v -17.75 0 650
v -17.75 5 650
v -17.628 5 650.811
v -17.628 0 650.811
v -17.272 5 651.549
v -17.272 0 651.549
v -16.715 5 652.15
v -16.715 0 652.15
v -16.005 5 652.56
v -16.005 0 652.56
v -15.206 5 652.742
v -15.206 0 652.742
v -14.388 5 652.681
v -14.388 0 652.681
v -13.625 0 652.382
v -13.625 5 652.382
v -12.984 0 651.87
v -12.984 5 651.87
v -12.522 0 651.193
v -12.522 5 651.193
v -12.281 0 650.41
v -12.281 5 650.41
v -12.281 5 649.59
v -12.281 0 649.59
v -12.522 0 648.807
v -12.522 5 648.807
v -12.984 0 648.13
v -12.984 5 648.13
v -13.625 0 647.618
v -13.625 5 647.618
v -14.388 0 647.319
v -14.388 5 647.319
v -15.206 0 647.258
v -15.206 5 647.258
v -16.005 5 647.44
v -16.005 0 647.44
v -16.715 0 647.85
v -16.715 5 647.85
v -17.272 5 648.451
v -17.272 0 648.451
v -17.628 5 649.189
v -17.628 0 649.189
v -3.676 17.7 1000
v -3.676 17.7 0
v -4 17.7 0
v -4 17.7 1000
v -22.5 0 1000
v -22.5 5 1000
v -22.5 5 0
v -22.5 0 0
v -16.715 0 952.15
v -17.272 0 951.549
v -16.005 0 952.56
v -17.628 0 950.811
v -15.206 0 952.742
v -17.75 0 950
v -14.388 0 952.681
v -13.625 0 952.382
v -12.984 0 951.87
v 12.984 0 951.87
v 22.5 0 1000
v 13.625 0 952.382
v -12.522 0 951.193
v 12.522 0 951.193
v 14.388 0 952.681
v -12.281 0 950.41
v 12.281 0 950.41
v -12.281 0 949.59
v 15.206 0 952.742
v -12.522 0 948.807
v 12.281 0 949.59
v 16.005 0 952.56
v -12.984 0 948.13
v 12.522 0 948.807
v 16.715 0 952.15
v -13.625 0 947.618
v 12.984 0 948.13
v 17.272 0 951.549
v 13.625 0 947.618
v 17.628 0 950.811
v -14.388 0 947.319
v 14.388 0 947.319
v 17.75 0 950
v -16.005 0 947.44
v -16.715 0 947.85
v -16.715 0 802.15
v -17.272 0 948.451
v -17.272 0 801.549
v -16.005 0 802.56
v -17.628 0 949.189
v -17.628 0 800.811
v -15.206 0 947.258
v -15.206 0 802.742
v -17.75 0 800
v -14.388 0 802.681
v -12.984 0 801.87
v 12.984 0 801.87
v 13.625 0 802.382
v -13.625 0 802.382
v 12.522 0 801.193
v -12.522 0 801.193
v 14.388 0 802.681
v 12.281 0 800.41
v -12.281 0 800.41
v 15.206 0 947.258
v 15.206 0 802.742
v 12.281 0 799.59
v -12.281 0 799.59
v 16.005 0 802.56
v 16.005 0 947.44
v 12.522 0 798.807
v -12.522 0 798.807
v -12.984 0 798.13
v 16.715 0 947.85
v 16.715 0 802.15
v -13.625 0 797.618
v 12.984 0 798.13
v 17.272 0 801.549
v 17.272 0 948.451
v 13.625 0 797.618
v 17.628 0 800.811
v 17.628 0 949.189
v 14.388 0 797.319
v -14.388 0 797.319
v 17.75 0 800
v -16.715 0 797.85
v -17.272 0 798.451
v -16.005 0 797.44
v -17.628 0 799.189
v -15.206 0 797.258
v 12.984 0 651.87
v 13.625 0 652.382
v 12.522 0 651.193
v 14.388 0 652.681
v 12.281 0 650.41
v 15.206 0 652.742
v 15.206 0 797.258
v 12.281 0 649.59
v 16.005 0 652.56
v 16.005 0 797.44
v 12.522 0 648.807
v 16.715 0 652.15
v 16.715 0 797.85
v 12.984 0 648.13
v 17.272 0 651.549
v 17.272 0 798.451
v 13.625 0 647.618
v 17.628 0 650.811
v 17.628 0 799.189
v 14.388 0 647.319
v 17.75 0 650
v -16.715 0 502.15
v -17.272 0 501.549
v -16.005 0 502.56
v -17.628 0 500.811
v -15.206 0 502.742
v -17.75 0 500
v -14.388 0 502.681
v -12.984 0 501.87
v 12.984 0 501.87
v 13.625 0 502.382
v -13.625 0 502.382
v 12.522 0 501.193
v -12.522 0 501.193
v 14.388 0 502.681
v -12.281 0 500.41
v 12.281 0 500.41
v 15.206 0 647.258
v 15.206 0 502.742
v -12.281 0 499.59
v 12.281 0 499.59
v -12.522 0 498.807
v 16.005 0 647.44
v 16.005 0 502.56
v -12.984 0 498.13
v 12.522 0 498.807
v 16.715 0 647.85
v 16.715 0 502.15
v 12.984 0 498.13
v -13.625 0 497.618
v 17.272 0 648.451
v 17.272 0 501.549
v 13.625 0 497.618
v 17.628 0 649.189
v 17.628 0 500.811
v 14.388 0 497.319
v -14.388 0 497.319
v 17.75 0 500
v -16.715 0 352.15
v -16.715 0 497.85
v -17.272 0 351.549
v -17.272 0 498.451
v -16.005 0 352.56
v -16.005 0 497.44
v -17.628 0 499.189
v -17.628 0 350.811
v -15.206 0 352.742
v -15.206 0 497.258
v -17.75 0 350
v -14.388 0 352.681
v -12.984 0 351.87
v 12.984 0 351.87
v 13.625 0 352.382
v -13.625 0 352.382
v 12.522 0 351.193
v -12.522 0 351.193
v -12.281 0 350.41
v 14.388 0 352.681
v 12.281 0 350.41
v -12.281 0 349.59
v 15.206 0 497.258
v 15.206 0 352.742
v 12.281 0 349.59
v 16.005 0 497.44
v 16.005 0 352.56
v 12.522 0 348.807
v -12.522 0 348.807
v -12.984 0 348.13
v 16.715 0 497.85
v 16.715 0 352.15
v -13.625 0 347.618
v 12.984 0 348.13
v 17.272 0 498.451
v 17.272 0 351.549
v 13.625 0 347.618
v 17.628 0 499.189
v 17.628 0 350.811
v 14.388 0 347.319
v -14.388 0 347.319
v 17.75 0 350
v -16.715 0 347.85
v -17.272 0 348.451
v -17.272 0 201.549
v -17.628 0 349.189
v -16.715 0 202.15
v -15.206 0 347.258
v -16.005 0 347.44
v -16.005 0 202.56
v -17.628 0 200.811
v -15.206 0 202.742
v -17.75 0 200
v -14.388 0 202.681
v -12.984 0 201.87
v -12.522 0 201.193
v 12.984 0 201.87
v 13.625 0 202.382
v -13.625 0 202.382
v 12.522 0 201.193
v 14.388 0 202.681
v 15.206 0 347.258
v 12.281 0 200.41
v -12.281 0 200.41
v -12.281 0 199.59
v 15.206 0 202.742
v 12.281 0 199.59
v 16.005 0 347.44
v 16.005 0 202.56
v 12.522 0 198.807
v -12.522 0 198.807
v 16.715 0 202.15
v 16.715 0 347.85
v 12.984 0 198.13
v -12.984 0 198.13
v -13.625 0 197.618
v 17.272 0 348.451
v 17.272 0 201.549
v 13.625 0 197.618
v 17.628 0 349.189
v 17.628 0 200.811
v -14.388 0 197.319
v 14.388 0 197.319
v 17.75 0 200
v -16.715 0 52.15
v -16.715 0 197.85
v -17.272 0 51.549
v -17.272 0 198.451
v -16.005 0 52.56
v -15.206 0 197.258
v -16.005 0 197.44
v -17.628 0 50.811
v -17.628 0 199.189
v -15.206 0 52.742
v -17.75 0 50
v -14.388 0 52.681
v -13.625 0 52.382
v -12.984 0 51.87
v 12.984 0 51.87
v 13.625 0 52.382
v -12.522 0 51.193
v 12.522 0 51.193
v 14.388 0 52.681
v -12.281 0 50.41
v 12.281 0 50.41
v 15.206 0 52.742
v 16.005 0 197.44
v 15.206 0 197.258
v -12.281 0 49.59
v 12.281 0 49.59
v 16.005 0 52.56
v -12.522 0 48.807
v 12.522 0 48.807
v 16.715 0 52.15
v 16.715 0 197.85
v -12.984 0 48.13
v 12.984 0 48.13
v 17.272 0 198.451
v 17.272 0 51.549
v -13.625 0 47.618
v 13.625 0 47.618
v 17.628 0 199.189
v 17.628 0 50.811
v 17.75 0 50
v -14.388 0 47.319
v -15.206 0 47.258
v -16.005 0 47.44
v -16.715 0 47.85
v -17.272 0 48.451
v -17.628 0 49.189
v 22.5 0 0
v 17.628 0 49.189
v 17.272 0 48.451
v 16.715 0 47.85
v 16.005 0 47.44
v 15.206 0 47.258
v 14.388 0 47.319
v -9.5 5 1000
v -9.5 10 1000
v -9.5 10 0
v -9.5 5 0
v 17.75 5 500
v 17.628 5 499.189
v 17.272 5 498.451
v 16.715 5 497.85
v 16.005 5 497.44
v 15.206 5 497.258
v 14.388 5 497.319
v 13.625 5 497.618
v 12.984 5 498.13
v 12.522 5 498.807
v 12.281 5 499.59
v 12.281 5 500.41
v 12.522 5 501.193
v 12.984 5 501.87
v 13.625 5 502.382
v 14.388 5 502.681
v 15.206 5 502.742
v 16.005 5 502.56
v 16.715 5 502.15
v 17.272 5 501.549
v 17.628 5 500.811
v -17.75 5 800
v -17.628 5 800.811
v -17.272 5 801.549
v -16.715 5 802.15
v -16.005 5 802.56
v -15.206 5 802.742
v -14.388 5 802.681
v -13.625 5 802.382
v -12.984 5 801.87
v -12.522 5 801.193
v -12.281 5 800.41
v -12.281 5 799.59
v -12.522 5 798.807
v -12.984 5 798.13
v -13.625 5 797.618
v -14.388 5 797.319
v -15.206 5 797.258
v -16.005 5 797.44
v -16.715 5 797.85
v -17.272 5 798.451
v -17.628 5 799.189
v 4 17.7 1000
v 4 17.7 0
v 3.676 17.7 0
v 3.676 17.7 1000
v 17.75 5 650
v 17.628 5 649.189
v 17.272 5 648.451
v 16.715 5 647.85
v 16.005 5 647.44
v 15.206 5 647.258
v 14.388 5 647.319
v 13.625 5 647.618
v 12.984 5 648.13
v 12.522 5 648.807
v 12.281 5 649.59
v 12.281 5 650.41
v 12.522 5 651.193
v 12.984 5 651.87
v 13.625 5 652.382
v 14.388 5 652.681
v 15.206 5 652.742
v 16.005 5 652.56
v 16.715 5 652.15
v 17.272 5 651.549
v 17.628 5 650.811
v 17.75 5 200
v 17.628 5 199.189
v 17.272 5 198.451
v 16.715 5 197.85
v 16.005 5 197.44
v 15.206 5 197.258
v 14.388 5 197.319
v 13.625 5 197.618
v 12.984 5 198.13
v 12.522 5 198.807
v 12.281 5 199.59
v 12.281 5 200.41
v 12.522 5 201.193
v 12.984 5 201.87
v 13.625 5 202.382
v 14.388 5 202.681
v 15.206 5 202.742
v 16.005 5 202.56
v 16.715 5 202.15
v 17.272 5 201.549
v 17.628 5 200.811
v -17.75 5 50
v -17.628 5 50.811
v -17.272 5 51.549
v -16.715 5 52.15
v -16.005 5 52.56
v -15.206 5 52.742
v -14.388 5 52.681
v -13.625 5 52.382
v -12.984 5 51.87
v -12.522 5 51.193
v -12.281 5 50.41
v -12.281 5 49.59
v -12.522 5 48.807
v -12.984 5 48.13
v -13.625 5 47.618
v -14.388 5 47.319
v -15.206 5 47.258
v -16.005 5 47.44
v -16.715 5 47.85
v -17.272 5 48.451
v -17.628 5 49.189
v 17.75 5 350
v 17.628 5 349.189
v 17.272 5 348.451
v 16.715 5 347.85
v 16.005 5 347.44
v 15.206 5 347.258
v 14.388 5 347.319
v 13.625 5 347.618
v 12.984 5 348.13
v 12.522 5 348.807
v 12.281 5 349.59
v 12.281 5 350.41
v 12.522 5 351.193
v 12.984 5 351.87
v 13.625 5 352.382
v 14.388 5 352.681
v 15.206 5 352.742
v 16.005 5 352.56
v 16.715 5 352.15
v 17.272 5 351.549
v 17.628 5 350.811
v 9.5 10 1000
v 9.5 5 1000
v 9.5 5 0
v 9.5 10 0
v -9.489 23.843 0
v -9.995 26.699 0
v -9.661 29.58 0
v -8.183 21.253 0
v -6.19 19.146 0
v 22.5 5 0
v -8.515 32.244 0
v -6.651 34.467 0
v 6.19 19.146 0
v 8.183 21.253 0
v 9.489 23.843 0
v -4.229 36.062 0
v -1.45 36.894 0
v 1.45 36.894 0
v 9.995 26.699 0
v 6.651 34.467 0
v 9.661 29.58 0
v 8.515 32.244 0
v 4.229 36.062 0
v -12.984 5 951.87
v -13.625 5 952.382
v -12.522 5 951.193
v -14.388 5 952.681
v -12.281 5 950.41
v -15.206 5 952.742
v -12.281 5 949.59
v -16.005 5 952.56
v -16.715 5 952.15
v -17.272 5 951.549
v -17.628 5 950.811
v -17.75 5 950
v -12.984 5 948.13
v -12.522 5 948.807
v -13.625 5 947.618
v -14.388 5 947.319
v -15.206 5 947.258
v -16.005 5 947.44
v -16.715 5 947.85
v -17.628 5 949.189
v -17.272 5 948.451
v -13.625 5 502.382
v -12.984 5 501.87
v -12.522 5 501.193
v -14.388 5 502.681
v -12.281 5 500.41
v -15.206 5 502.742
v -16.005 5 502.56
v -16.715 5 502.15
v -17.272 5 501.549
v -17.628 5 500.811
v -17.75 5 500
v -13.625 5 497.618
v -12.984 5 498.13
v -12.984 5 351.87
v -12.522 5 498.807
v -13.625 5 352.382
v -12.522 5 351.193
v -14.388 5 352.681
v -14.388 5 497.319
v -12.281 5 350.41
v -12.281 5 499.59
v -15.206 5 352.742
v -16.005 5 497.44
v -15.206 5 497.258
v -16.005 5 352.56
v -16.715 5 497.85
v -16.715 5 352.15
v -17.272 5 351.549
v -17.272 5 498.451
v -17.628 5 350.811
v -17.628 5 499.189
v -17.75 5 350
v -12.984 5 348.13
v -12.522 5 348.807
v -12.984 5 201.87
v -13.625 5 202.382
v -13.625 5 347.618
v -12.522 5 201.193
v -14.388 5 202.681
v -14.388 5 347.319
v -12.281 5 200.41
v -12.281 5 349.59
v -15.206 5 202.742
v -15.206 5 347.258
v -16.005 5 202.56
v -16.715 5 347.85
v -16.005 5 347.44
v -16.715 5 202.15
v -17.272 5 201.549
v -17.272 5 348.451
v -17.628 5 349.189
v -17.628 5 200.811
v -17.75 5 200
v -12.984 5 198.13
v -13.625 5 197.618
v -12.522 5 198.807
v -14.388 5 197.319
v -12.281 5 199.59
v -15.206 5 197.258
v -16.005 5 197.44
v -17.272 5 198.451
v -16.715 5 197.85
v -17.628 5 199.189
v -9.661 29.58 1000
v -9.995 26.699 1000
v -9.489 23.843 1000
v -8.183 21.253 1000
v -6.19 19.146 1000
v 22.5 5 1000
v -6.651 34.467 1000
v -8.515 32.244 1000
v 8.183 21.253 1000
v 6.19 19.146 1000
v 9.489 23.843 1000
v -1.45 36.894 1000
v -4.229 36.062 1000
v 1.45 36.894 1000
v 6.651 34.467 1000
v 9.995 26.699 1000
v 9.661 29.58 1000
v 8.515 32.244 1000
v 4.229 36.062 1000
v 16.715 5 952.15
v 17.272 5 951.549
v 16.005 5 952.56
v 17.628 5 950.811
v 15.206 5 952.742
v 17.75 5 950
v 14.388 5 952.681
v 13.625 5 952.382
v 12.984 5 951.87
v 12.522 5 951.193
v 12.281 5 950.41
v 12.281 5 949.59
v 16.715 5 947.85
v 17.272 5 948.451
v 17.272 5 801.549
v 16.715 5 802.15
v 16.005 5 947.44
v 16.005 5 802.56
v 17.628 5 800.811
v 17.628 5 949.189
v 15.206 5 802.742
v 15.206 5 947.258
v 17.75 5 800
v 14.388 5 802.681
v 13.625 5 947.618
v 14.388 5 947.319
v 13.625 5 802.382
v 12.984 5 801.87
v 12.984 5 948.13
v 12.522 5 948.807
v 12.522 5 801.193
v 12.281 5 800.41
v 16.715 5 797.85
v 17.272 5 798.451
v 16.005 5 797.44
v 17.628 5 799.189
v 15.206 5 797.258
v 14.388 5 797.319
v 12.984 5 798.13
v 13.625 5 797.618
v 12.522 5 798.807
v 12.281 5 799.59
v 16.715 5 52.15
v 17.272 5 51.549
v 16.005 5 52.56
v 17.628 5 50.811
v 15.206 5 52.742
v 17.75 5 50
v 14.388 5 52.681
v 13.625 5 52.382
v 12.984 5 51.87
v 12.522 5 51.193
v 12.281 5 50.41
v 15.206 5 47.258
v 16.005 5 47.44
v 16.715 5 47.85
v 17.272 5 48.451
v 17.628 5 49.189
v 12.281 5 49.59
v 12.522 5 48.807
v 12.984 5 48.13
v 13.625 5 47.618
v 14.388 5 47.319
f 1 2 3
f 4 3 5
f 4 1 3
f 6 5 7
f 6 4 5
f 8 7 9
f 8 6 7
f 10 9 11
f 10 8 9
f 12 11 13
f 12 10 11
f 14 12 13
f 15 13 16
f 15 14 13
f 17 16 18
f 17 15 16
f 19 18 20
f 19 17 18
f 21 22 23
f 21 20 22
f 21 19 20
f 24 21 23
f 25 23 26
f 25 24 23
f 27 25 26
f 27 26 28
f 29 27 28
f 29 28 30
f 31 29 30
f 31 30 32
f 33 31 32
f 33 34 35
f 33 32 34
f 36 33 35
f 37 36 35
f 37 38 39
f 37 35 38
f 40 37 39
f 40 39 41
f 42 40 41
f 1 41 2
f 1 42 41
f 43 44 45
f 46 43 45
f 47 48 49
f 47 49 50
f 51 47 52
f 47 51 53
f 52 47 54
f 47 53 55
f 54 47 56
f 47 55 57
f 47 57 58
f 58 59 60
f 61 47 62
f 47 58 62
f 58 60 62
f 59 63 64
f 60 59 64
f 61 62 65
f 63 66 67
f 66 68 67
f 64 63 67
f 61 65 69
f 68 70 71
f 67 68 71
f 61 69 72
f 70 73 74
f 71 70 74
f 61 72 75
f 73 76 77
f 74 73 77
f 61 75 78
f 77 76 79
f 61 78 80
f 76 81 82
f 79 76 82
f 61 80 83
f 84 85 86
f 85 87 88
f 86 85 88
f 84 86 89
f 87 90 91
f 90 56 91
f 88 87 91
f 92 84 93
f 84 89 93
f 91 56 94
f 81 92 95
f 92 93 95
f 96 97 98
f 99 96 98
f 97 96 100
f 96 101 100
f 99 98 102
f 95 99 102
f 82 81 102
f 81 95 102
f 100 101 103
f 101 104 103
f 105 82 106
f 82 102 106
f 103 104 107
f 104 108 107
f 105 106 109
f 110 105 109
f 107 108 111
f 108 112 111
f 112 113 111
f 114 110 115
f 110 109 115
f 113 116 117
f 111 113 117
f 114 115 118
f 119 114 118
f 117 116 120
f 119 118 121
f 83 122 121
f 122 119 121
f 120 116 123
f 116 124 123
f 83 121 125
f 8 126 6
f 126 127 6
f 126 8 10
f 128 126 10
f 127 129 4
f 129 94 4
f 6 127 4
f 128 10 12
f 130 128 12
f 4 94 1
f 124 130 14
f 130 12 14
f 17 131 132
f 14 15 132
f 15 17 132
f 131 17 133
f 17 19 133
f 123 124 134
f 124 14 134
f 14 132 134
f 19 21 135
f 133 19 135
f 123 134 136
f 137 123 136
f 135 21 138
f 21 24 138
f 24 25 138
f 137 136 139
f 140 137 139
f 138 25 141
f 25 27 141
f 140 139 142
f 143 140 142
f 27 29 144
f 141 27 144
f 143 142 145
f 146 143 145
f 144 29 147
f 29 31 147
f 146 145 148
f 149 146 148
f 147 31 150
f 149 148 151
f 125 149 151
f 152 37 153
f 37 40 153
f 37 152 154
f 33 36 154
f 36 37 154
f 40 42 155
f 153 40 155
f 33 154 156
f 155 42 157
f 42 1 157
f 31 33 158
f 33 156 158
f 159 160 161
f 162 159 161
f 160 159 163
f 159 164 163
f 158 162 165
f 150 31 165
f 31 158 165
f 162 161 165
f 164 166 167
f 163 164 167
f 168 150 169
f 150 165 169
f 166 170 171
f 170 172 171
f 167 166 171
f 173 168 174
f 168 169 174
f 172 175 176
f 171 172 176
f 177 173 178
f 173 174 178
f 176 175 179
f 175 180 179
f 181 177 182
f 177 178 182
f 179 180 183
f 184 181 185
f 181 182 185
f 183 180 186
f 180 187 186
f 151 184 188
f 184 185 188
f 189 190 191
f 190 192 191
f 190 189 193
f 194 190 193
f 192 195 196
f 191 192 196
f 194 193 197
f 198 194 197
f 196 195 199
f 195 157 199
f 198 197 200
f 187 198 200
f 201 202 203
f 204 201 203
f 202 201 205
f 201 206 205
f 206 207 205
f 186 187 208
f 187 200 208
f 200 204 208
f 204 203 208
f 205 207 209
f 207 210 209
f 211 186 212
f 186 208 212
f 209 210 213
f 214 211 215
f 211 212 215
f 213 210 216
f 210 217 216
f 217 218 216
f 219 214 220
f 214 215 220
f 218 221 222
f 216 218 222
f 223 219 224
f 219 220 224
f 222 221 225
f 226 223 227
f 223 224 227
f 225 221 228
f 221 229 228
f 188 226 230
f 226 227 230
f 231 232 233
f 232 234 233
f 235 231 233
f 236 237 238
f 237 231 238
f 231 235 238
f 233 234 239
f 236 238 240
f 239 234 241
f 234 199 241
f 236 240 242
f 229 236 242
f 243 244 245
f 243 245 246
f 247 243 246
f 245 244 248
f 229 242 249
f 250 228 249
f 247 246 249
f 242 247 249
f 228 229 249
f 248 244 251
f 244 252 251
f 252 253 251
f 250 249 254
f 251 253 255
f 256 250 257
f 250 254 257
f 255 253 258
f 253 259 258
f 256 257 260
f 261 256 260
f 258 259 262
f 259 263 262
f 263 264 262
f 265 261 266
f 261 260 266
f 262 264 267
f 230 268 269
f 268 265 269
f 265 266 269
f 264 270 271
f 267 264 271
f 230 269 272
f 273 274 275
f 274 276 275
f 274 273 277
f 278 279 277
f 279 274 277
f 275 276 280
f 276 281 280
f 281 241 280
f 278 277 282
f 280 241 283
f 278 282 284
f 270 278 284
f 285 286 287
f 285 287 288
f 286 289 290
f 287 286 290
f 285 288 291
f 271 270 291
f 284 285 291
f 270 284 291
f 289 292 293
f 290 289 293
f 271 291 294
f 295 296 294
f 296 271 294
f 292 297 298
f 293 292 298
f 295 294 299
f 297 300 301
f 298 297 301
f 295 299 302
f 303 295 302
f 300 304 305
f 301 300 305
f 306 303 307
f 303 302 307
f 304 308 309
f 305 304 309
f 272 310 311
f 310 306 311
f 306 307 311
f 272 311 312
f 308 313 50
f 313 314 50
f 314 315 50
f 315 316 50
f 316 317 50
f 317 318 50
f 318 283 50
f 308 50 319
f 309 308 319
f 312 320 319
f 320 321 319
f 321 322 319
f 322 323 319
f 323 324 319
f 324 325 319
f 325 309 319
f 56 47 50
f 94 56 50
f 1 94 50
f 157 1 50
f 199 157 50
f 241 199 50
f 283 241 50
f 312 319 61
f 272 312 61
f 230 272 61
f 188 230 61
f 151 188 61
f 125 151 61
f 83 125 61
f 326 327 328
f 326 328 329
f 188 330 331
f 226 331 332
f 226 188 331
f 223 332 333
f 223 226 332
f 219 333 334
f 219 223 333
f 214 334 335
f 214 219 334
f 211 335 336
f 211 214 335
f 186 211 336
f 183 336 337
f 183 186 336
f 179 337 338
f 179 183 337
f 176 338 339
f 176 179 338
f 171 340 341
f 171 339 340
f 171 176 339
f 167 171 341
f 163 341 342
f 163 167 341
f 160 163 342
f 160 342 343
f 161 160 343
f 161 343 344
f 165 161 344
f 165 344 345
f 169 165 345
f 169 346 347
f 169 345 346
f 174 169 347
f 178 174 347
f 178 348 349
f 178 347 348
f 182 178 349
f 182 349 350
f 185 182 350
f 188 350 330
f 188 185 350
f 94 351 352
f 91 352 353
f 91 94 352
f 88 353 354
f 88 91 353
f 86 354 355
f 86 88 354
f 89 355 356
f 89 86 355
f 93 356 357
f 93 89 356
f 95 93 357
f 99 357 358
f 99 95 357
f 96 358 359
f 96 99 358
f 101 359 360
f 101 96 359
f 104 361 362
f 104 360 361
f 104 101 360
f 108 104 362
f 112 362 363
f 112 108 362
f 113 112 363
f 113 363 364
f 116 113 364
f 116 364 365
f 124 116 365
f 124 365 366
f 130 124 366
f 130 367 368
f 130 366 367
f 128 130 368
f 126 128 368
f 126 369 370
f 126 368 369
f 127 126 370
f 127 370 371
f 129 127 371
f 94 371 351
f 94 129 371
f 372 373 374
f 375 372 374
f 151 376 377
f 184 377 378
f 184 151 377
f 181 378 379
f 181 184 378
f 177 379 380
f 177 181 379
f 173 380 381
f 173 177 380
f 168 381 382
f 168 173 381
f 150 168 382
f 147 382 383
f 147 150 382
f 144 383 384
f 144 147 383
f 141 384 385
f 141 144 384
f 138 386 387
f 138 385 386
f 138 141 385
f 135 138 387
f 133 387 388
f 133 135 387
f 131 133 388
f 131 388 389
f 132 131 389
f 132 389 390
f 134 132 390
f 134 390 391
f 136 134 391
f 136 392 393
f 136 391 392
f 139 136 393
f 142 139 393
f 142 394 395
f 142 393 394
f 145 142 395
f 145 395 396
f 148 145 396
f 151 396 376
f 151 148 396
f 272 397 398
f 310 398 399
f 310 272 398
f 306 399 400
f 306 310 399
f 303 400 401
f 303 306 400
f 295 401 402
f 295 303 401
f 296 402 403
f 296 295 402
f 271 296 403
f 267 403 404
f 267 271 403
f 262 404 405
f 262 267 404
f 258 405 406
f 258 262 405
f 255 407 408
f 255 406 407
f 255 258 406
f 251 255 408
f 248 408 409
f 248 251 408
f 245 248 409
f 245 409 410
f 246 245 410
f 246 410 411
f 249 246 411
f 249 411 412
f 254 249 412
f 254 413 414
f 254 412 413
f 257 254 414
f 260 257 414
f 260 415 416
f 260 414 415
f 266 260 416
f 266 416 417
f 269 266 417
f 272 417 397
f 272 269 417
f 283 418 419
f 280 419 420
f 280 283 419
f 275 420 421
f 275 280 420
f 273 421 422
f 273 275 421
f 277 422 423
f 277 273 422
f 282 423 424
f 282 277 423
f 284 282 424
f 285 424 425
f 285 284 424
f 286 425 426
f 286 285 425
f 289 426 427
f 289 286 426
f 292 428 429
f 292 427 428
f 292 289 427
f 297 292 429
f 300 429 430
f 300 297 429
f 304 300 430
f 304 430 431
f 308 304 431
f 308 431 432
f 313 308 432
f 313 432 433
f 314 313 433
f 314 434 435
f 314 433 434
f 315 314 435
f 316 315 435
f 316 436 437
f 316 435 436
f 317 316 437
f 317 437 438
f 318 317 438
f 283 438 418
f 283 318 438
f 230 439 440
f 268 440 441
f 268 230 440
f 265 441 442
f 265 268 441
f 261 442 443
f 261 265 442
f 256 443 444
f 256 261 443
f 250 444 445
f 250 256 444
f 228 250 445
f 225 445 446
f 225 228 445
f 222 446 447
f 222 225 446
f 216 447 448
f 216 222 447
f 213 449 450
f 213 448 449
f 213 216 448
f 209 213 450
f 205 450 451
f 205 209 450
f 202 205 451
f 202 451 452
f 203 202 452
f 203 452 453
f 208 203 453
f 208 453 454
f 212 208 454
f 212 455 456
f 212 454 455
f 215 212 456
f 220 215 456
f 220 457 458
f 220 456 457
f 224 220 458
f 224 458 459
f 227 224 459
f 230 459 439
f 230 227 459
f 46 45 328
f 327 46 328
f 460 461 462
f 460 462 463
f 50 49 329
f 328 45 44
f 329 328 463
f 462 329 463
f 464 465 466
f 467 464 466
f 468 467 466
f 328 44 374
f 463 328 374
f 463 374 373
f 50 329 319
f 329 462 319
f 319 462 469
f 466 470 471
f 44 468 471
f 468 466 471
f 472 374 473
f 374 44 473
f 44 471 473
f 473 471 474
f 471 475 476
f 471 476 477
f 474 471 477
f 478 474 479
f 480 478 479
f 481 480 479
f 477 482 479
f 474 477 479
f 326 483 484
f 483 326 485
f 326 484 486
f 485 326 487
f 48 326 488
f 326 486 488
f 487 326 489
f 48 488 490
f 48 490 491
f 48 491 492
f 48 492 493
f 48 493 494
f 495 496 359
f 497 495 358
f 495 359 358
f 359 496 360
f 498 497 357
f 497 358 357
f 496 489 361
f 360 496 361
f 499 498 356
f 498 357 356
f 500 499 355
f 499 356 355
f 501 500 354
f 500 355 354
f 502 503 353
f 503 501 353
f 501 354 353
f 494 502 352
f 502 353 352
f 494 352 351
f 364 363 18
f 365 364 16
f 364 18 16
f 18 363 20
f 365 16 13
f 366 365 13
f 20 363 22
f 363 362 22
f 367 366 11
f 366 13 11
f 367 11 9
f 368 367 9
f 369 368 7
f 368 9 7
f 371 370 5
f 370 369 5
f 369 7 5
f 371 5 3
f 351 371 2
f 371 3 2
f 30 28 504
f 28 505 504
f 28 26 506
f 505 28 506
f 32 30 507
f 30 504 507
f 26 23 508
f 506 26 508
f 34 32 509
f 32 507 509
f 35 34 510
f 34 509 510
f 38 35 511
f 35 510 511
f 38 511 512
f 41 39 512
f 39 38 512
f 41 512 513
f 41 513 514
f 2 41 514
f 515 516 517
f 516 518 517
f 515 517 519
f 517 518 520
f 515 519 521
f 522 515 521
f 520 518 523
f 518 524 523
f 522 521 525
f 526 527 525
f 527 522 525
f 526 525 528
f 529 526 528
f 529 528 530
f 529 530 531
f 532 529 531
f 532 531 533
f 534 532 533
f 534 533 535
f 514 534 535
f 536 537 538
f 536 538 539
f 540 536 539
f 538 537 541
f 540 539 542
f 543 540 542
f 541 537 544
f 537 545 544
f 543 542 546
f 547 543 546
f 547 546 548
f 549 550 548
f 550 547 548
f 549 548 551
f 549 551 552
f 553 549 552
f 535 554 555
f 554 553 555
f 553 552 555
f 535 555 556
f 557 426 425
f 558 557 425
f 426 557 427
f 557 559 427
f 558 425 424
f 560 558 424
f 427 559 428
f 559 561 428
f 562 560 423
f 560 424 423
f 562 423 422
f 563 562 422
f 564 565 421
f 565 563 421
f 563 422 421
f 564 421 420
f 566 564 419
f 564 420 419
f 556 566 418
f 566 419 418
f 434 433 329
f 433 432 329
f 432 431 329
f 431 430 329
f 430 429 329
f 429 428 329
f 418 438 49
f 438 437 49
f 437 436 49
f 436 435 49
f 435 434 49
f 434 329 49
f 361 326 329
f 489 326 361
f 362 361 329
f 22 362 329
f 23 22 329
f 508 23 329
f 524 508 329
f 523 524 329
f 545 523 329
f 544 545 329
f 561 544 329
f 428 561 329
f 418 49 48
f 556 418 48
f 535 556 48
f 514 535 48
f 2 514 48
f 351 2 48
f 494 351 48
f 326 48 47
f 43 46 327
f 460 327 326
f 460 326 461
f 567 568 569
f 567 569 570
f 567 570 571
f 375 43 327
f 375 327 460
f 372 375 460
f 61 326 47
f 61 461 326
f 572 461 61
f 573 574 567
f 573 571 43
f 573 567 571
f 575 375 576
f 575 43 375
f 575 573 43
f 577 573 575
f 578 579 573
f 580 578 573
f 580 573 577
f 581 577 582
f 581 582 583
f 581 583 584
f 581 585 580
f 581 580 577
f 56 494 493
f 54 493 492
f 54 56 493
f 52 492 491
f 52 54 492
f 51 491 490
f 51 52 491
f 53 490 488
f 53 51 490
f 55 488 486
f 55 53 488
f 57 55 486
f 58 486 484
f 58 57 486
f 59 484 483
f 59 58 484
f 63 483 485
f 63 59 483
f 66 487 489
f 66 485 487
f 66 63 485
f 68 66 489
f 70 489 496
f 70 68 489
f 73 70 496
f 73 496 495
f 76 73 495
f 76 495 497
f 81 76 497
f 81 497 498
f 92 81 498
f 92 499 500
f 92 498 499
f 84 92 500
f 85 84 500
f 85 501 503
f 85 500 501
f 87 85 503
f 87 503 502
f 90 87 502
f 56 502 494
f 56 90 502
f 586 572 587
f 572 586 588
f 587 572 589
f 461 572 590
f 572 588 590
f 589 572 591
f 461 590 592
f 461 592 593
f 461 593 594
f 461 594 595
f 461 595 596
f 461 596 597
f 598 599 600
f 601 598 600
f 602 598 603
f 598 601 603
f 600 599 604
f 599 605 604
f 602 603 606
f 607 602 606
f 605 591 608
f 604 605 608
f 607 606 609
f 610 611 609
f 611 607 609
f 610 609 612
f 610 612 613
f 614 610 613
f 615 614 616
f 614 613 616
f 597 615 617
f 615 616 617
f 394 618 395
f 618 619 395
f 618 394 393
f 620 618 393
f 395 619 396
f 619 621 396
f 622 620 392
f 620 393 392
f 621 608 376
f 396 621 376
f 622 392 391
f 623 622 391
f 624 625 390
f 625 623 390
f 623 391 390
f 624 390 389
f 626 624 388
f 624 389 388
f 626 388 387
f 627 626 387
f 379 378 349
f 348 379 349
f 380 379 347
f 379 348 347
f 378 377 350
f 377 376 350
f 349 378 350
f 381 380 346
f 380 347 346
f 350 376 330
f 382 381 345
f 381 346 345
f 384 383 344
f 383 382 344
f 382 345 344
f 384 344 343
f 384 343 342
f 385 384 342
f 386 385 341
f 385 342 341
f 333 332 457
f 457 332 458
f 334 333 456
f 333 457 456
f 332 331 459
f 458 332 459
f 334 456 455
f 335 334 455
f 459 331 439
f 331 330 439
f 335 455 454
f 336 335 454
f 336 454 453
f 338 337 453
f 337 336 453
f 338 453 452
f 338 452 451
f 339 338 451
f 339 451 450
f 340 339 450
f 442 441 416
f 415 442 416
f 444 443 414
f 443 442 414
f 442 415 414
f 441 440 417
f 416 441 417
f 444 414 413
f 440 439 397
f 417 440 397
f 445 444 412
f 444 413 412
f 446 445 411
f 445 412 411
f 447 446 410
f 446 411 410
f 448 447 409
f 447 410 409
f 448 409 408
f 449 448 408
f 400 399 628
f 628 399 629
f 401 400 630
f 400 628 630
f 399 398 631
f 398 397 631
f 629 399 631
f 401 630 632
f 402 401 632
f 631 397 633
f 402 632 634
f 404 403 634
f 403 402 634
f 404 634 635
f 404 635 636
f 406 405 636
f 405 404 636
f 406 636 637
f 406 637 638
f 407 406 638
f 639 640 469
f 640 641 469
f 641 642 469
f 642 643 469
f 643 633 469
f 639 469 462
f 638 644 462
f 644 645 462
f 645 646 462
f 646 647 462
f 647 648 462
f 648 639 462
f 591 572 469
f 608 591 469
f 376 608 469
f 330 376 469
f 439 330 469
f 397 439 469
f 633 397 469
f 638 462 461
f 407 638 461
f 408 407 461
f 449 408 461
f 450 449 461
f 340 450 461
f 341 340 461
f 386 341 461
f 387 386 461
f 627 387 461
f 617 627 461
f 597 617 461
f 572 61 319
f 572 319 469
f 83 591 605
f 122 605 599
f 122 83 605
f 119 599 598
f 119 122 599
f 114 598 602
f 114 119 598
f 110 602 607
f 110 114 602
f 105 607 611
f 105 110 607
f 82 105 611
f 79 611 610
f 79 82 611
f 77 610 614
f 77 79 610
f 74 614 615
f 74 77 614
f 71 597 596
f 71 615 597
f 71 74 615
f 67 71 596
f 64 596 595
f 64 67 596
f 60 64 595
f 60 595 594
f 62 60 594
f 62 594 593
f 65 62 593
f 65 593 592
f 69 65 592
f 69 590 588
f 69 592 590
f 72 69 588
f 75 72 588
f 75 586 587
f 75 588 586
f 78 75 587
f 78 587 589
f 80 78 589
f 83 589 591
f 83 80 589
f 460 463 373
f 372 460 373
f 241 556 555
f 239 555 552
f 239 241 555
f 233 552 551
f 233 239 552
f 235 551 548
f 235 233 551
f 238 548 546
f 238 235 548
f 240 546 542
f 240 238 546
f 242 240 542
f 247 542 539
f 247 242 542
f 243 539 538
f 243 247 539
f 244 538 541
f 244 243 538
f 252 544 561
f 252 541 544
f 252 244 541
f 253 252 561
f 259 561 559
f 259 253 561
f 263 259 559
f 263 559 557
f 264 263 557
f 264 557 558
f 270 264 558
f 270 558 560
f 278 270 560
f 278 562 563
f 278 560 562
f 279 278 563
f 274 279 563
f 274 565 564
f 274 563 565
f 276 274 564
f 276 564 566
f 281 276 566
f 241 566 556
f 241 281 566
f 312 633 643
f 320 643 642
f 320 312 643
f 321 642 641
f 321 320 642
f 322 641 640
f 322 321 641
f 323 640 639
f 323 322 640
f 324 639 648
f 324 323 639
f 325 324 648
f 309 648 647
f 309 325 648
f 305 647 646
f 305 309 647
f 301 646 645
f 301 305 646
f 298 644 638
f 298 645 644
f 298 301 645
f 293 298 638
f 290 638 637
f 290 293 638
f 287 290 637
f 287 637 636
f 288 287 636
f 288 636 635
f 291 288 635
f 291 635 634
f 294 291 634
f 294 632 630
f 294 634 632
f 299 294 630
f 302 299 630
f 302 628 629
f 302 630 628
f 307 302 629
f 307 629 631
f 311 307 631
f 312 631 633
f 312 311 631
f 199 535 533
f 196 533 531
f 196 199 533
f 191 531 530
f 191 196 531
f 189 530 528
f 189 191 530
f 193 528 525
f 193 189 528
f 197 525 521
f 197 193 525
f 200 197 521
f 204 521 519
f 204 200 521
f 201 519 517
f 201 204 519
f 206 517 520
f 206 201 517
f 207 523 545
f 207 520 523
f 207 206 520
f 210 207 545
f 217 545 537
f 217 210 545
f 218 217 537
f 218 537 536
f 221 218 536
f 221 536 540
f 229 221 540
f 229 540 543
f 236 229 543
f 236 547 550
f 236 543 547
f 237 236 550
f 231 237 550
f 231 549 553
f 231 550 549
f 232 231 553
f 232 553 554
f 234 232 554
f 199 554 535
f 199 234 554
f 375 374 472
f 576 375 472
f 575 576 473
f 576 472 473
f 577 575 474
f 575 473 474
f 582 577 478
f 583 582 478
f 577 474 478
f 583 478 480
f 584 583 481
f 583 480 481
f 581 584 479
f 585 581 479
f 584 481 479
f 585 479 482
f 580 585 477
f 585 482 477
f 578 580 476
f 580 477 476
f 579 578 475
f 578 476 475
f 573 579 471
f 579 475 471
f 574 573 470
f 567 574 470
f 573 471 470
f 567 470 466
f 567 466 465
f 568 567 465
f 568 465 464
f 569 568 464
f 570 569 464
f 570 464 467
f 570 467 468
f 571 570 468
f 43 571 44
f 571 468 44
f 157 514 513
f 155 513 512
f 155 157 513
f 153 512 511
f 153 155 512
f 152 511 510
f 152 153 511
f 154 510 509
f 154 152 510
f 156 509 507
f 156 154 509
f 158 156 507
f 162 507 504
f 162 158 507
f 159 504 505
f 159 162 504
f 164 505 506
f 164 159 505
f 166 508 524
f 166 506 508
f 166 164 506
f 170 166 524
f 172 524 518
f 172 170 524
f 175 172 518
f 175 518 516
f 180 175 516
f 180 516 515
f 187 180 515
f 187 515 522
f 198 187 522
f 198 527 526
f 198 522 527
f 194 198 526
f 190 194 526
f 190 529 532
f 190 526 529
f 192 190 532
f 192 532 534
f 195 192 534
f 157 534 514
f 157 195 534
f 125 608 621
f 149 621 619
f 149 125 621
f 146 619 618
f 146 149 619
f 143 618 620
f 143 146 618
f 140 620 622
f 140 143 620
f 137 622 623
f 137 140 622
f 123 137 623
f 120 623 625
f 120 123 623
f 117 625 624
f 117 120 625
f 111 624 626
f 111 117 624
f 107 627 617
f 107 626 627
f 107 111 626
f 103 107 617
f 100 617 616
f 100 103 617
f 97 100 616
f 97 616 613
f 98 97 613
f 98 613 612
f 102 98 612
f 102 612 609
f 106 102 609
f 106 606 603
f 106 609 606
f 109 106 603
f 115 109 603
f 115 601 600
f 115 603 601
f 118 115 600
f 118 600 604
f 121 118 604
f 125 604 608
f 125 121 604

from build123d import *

# Parameters (mm, degrees)
SKETCH_1_R          = 10
EXTRUDE_1_DEPTH     = 1000
SKETCH_2_R          = 2.75
CUT_EXTRUDE_2_DEPTH = 450


with BuildPart() as part:
    # 草图1 → 凸台-拉伸1 (new body)
    with BuildSketch(Plane.XY):
        with Locations((0, 27)):
            Circle(SKETCH_1_R)
        with BuildLine():
            Line((-22.5, 5), (-22.5, 0))
            Line((-22.5, 0), (0, 0))
            Line((0, 0), (0, 17))
            ThreePointArc((0, 17), (-1.870828693, 17.176558648), (-3.67559519, 17.7))
            Line((-3.67559519, 17.7), (-4, 17.7))
            Line((-4, 17.7), (-9.5, 10))
            Line((-9.5, 10), (-9.5, 5))
            Line((-9.5, 5), (-22.5, 5))
        make_face()
        with BuildLine():
            Line((0, 17), (0, 0))
            Line((0, 0), (22.5, 0))
            Line((22.5, 0), (22.5, 5))
            Line((22.5, 5), (9.5, 5))
            Line((9.5, 5), (9.5, 10))
            Line((9.5, 10), (4, 17.7))
            Line((4, 17.7), (3.67559519, 17.7))
            ThreePointArc((3.67559519, 17.7), (1.870828693, 17.176558648), (0, 17))
        make_face()
    extrude(amount=EXTRUDE_1_DEPTH)

    # 草图2 → 切除-拉伸2 (cut)
    with BuildSketch(Plane(origin=(0, 0, 0), x_dir=(1, 0, 0), z_dir=(0, 1, 0))):
        with Locations((15, -500)):
            Circle(SKETCH_2_R)
        with Locations((15, -650)):
            Circle(SKETCH_2_R)
        with Locations(Location((-15, -500, 0), (0, 0, 180))):
            Circle(SKETCH_2_R)
        with Locations(Location((-15, -650, 0), (0, 0, 180))):
            Circle(SKETCH_2_R)
        with Locations((15, -350)):
            Circle(SKETCH_2_R)
        with Locations(Location((-15, -350, 0), (0, 0, 180))):
            Circle(SKETCH_2_R)
        with Locations(Location((-15, -200, 0), (0, 0, 180))):
            Circle(SKETCH_2_R)
        with Locations((15, -200)):
            Circle(SKETCH_2_R)
        with Locations(Location((-15, -50, 0), (0, 0, 180))):
            Circle(SKETCH_2_R)
        with Locations((15, -50)):
            Circle(SKETCH_2_R)
        with Locations(Location((-15, -800, 0), (0, 0, 180))):
            Circle(SKETCH_2_R)
        with Locations((15, -800)):
            Circle(SKETCH_2_R)
        with Locations(Location((-15, -950, 0), (0, 0, 180))):
            Circle(SKETCH_2_R)
        with Locations((15, -950)):
            Circle(SKETCH_2_R)
    extrude(amount=CUT_EXTRUDE_2_DEPTH, mode=Mode.SUBTRACT)


solid = part.part
